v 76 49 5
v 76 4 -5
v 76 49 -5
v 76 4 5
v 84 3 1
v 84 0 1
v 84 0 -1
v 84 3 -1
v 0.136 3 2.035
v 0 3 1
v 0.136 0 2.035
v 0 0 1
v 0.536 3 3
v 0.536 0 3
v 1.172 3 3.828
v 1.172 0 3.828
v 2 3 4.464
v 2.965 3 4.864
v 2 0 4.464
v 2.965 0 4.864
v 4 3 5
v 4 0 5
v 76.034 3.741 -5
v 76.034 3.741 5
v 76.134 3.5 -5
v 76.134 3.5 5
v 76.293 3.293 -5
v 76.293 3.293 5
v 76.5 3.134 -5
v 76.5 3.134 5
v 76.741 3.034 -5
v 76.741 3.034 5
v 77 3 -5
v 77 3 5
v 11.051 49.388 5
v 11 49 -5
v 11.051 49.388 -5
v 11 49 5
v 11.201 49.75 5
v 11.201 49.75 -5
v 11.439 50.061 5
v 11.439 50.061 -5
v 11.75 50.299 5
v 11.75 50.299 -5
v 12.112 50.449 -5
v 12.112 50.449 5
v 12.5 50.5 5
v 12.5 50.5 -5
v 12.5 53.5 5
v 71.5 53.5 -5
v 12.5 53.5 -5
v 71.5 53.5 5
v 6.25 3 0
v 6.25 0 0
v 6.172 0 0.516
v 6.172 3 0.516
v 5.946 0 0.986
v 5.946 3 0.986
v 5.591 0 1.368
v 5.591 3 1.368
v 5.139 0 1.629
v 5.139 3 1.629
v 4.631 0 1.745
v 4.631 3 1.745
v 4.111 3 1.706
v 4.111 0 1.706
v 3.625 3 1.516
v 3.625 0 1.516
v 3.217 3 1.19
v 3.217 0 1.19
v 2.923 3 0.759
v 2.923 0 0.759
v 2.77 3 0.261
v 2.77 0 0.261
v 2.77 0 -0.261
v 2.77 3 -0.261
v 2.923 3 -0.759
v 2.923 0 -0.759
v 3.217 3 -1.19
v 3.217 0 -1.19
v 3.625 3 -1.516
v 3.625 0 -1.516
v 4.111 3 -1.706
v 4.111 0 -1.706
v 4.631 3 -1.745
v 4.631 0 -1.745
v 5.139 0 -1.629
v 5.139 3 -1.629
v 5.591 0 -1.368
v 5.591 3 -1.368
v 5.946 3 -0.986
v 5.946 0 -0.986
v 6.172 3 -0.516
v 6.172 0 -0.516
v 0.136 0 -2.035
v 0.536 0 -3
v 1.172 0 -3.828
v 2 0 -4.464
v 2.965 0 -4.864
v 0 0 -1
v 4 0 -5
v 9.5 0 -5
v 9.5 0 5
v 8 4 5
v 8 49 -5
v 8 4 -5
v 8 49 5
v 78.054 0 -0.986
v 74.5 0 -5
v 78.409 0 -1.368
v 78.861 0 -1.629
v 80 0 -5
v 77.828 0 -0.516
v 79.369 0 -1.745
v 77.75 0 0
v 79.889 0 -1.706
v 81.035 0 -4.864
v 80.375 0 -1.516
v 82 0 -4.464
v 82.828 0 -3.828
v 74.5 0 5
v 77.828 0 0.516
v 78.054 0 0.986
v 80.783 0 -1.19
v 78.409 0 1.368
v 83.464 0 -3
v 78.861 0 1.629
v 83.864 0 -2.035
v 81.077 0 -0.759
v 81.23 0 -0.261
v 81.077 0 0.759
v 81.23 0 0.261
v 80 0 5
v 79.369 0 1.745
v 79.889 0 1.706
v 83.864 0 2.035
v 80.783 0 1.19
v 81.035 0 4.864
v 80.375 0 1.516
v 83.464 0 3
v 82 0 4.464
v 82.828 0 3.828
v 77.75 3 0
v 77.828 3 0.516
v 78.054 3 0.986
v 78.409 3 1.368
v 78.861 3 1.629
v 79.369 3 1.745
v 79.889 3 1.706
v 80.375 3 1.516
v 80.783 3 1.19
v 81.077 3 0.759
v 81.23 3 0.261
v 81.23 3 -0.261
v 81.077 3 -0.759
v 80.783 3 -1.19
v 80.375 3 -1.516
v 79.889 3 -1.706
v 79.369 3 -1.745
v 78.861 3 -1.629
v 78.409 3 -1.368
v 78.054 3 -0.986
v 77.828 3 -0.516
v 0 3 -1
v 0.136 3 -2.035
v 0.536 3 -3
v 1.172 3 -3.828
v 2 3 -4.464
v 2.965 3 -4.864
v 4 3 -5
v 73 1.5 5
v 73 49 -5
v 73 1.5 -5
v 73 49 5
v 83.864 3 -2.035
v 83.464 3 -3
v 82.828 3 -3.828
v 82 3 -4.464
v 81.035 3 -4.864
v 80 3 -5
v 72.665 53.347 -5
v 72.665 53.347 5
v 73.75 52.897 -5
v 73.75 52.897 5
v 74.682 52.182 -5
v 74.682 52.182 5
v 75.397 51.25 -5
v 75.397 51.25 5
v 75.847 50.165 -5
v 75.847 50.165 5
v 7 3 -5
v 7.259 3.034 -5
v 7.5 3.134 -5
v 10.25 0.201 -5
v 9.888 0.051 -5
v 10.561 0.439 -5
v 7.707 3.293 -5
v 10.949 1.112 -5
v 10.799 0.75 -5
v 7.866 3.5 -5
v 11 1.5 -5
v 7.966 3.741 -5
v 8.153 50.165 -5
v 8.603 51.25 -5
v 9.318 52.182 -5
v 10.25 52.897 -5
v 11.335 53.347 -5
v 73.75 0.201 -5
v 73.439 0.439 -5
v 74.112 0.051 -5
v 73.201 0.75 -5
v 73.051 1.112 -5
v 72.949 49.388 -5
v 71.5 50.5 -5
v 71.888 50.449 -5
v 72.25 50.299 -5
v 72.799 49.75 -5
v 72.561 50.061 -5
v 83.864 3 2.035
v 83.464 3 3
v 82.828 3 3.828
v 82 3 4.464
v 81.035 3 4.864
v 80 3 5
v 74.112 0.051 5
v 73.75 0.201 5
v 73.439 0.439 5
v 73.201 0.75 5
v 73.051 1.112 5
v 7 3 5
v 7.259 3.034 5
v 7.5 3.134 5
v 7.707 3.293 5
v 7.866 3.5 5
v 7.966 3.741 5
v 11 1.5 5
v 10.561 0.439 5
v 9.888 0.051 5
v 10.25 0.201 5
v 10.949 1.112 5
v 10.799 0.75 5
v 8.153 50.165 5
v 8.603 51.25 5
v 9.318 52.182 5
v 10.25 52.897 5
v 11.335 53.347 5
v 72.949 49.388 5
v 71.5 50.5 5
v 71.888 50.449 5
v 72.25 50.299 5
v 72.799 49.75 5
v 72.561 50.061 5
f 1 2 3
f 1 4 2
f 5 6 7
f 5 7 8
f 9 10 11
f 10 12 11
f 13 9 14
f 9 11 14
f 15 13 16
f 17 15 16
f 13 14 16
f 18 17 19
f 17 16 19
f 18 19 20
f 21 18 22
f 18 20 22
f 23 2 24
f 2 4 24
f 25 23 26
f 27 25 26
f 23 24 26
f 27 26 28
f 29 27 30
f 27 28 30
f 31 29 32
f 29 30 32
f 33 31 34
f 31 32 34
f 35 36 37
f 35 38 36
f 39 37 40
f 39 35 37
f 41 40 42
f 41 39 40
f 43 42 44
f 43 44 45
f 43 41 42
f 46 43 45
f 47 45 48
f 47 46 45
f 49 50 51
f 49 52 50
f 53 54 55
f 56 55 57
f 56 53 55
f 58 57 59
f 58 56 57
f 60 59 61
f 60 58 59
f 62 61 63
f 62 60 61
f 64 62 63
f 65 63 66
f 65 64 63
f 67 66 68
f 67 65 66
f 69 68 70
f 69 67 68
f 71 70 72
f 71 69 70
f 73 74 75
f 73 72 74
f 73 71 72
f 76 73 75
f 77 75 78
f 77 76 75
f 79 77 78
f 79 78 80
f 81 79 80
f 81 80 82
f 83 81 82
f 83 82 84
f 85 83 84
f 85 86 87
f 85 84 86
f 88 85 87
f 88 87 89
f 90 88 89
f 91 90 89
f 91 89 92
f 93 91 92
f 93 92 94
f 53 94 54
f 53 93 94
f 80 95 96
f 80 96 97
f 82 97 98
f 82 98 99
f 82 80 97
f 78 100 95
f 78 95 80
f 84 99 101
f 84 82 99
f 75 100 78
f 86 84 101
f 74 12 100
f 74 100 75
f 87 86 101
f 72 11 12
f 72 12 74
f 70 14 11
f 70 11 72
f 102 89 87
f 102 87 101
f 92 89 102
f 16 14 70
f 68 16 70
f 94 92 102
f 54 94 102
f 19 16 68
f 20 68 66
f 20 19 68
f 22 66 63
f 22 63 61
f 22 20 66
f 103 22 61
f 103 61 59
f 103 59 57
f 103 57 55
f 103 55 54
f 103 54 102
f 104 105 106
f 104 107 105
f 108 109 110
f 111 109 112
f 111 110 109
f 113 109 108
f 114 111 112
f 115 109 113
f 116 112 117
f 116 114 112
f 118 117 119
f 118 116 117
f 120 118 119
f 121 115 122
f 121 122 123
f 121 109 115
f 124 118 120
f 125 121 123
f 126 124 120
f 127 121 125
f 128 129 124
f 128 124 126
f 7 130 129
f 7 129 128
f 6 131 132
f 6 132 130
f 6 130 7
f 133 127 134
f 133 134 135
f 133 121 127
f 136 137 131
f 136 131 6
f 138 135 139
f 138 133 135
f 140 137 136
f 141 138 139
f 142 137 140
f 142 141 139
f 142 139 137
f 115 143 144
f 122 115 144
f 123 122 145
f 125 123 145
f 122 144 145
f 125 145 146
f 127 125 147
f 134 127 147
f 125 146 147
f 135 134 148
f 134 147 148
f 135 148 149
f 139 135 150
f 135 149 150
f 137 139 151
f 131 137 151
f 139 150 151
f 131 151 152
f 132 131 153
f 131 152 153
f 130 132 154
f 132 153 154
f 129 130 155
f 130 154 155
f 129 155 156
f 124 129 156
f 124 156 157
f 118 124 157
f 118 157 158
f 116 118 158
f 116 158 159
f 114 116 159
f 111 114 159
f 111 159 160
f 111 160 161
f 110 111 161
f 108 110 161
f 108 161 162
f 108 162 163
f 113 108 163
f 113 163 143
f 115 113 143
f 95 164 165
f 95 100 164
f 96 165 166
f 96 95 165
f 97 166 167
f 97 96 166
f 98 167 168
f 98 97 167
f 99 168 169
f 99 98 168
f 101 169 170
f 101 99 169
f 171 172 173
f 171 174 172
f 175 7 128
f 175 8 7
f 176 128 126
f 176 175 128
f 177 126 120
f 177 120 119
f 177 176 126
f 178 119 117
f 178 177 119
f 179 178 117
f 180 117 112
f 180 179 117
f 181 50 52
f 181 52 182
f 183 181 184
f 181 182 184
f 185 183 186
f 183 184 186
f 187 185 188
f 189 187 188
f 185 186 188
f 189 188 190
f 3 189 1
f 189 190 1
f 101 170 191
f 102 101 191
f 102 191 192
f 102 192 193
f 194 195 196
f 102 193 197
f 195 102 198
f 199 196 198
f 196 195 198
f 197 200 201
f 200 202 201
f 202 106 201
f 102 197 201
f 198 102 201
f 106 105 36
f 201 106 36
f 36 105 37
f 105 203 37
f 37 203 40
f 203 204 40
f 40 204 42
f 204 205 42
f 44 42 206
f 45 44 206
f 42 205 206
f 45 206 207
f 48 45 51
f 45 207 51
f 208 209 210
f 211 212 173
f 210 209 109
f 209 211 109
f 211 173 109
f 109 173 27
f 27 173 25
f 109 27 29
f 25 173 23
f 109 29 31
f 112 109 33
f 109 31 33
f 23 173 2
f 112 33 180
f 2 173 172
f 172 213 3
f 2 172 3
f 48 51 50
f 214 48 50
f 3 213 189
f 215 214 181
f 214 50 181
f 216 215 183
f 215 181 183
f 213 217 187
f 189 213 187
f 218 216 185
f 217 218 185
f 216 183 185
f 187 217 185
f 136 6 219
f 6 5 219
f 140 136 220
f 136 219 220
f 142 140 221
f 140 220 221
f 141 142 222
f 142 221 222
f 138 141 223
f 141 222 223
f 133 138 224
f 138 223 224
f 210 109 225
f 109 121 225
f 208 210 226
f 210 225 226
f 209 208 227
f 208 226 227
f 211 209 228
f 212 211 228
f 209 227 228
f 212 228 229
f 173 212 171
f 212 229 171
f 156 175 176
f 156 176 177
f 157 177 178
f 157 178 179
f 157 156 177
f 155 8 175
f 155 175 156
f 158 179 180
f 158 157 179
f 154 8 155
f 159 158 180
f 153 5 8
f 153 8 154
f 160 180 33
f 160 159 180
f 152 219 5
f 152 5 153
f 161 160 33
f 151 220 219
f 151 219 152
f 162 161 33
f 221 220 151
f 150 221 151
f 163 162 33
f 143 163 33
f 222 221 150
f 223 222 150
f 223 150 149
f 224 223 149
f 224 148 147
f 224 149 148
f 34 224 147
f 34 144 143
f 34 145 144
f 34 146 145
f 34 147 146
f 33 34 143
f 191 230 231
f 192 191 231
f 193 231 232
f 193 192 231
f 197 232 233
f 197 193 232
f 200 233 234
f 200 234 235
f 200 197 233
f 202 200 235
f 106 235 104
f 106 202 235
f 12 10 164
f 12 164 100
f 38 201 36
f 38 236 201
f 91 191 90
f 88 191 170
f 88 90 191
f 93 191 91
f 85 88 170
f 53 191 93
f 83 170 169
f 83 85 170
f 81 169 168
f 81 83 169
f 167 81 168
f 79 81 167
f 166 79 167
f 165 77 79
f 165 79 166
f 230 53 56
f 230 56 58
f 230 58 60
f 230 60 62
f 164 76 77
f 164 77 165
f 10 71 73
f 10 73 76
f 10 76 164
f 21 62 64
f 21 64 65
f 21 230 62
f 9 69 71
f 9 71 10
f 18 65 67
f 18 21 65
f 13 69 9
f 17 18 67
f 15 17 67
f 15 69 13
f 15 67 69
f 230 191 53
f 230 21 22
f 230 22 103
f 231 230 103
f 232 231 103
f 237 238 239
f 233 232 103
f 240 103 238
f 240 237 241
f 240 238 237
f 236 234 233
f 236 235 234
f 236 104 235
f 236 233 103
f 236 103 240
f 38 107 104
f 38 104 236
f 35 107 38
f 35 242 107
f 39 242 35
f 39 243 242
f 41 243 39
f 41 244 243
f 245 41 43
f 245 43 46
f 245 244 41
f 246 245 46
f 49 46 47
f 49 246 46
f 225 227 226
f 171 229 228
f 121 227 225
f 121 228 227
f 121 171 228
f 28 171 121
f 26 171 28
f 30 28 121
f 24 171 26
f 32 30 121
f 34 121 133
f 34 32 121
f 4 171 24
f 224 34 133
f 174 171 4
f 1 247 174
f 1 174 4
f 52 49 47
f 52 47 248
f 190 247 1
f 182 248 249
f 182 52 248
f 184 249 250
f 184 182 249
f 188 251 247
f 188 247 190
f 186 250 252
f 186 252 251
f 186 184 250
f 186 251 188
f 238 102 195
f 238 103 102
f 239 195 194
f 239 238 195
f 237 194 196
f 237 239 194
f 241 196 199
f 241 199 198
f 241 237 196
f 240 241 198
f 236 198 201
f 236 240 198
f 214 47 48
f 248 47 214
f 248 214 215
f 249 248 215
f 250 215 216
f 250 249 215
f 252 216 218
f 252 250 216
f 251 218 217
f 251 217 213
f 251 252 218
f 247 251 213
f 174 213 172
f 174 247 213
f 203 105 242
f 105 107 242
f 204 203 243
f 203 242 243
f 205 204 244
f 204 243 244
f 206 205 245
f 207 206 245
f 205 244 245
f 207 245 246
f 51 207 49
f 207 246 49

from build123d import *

# Parameters (mm, degrees)
SALIENTE_EXTRUIR1_DEPTH = 5
REDONDEO1_R             = 4
CROQUIS2_R              = 1.75
CORTAR_EXTRUIR1_DEPTH   = 99.138932132
REDONDEO2_R             = 1.5
REDONDEO3_R             = 4.5
REDONDEO4_R             = 1.5
REDONDEO5_R             = 1


with BuildPart() as part:
    # Croquis1 → Saliente-Extruir1 (new, symmetric)
    with BuildSketch(Plane.XY):
        Polygon((0, 0), (11, 0), (11, 50.5), (73, 50.5), (73, 0), (84, 0), (84, 3), (76, 3), (76, 53.5), (8, 53.5), (8, 3), (0, 3), align=None)
    extrude(amount=SALIENTE_EXTRUIR1_DEPTH, both=True)

    # Redondeo1
    redondeo1_edges = [part.edges().sort_by_distance(p)[0] for p in [
        (84, 1.5, -5),
        (0, 1.5, -5),
        (84, 1.5, 5),
        (0, 1.5, 5),
    ]]
    fillet(redondeo1_edges, radius=REDONDEO1_R)

    # Croquis2 → Cortar-Extruir1 (cut, through all)
    with BuildSketch(Plane(origin=(0, 3, 0), x_dir=(1, 0, 0), z_dir=(0, 1, 0))):
        with Locations(Location((79.5, 0, 0), (0, 0, 180))):
            Circle(CROQUIS2_R)
    cortar_extruir1 = extrude(amount=-CORTAR_EXTRUIR1_DEPTH, mode=Mode.SUBTRACT)

    # Simetría1: Cortar-Extruir1 across plane
    add(cortar_extruir1.mirror(Plane(origin=(42, 0, 0), x_dir=(0, 0, 1), z_dir=(1, 0, 0))), mode=Mode.SUBTRACT)

    # Redondeo2
    redondeo2_edges = [part.edges().sort_by_distance(p)[0] for p in [
        (73, 50.5, 0),
        (11, 50.5, 0),
    ]]
    fillet(redondeo2_edges, radius=REDONDEO2_R)

    # Redondeo3
    redondeo3_edges = [part.edges().sort_by_distance(p)[0] for p in [
        (8, 53.5, 0),
        (76, 53.5, 0),
    ]]
    fillet(redondeo3_edges, radius=REDONDEO3_R)

    # Redondeo4
    redondeo4_edges = [part.edges().sort_by_distance(p)[0] for p in [
        (73, 0, 0),
        (11, 0, 0),
    ]]
    fillet(redondeo4_edges, radius=REDONDEO4_R)

    # Redondeo5
    redondeo5_edges = [part.edges().sort_by_distance(p)[0] for p in [
        (8, 3, 0),
        (76, 3, 0),
    ]]
    fillet(redondeo5_edges, radius=REDONDEO5_R)


solid = part.part
